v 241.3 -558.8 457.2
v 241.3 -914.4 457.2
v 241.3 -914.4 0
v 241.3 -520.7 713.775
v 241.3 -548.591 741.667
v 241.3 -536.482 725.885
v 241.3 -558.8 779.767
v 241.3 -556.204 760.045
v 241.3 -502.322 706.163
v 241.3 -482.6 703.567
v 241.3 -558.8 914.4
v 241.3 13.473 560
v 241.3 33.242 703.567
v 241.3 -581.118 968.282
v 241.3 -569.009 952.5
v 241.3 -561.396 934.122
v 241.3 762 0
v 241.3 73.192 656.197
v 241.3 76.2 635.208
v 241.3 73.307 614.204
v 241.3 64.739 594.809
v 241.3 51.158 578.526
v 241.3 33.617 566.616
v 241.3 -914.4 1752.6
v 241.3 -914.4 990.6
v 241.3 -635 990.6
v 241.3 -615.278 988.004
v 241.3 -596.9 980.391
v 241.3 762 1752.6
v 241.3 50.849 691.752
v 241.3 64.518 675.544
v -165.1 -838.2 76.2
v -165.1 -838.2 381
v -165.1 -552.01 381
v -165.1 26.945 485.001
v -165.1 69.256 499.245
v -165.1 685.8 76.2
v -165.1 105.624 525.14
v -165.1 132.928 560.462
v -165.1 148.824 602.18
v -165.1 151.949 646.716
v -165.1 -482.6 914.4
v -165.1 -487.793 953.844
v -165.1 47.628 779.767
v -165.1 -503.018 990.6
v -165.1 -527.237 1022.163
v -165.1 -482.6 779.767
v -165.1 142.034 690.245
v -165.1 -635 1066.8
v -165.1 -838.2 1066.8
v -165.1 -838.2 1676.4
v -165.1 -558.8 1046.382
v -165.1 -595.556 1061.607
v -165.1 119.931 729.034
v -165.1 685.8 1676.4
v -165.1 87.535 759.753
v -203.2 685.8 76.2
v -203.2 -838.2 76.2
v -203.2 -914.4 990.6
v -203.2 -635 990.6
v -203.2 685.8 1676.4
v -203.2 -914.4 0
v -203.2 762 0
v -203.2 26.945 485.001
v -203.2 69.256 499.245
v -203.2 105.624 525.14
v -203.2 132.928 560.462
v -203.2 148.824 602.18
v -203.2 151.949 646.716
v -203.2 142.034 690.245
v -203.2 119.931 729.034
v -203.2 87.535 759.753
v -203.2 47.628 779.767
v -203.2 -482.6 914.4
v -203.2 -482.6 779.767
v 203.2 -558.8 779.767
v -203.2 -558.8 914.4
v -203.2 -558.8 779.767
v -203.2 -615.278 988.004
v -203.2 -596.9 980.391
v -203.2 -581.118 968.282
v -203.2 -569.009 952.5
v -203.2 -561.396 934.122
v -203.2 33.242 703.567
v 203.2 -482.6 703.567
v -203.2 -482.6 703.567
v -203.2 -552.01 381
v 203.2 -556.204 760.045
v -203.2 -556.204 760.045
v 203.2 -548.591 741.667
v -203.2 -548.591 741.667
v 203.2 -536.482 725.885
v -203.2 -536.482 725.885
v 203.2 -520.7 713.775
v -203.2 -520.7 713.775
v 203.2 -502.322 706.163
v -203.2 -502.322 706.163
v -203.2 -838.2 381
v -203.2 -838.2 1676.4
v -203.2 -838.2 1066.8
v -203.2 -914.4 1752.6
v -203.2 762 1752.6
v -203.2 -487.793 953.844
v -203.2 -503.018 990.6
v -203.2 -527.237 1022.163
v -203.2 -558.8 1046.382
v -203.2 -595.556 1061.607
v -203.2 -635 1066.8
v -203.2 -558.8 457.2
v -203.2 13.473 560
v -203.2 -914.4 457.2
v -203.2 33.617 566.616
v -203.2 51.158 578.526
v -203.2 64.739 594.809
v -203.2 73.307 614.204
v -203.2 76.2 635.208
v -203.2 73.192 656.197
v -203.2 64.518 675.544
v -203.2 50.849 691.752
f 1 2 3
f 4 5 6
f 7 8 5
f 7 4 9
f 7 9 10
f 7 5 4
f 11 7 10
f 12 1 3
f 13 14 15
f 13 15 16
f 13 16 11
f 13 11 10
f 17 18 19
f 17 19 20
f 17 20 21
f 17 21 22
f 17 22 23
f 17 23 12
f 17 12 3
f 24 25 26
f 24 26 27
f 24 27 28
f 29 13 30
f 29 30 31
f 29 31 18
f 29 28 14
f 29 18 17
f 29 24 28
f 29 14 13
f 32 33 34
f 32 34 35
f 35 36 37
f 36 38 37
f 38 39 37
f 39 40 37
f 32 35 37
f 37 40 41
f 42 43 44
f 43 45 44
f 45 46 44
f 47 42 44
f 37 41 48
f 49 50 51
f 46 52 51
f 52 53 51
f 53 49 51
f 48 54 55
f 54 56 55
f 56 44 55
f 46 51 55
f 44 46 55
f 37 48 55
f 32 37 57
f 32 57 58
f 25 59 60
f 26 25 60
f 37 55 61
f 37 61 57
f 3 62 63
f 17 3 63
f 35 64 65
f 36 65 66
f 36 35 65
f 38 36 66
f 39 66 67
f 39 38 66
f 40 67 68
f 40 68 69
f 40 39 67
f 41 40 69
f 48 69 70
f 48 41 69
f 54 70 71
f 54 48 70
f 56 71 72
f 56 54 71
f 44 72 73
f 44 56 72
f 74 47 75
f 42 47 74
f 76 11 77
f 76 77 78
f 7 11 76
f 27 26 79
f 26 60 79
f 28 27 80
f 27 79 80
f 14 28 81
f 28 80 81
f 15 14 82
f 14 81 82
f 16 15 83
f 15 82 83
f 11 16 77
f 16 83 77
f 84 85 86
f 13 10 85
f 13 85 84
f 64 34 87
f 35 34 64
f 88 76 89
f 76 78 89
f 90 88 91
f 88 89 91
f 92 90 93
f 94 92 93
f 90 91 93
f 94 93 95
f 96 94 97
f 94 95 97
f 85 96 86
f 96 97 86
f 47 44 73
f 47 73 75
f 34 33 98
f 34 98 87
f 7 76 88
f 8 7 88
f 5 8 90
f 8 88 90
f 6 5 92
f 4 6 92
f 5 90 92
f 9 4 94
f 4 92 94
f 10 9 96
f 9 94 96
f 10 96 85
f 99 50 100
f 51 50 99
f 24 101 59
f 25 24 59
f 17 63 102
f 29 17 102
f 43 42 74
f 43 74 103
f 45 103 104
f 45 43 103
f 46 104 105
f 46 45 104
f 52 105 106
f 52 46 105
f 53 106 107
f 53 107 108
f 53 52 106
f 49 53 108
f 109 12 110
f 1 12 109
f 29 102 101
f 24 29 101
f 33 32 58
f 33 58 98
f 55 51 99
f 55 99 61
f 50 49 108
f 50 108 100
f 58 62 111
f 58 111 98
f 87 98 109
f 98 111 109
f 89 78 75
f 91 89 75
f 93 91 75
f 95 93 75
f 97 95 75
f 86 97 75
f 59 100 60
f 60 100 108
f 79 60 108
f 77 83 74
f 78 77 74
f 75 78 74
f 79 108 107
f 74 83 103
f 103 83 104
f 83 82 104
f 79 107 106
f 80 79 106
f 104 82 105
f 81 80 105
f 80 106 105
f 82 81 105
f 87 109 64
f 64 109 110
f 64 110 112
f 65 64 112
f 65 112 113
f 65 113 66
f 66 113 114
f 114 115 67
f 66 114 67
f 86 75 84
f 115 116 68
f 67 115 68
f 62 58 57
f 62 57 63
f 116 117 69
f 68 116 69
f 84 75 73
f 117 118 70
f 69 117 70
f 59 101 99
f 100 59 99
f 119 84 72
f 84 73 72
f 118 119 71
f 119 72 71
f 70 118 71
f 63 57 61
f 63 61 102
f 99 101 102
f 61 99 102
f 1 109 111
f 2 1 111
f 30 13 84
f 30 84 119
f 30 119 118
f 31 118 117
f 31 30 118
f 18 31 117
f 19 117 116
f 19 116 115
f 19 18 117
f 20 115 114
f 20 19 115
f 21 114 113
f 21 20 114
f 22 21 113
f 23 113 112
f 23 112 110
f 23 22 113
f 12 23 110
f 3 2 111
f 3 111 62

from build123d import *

# Parameters (mm, degrees)
F1_DEPTH = 38.1
F3_DEPTH = 203.2


with BuildPart() as f1:
    # F0 (on Right) → F1 (new body, symmetric)
    with BuildSketch(Plane.YZ):
        with BuildLine():
            ThreePointArc((33.242401, 703.56663), (75.487635, 624.604952), (13.472578, 560.000469))
            Line((13.472578, 560.000469), (-558.8, 457.2))
            Line((-558.8, 457.2), (-914.4, 457.2))
            Line((-914.4, 457.2), (-914.4, 0))
            Line((-914.4, 0), (762, 0))
            Line((762, 0), (762, 1752.6))
            Line((762, 1752.6), (0, 1752.6))
            Line((0, 1752.6), (-914.4, 1752.6))
            Line((-914.4, 1752.6), (-914.4, 1295.4))
            Line((-914.4, 1295.4), (-914.4, 990.6))
            Line((-914.4, 990.6), (-635, 990.6))
            ThreePointArc((-635, 990.6), (-581.118463, 968.281537), (-558.8, 914.4))
            Line((-558.8, 914.4), (-558.8, 779.76663))
            ThreePointArc((-558.8, 779.76663), (-536.481537, 725.885093), (-482.6, 703.56663))
            Line((-482.6, 703.56663), (33.242401, 703.56663))
        make_face()
    extrude(amount=F1_DEPTH, both=True)


with BuildPart() as f3:
    # F2 (on Right) + F1_face (on face) → F3 (new body, symmetric)
    with BuildSketch(Plane.YZ):
        with BuildLine():
            Line((-482.6, 703.56663), (33.242401, 703.56663))
            ThreePointArc((33.242401, 703.56663), (75.487635, 624.604952), (13.472578, 560.000469))
            Line((13.472578, 560.000469), (-558.8, 457.2))
            Line((-558.8, 457.2), (-914.4, 457.2))
            Line((-914.4, 457.2), (-914.4, 0))
            Line((-914.4, 0), (762, 0))
            Line((762, 0), (762, 1752.6))
            Line((762, 1752.6), (-914.4, 1752.6))
            Line((-914.4, 1752.6), (-914.4, 990.6))
            Line((-914.4, 990.6), (-635, 990.6))
            ThreePointArc((-635, 990.6), (-581.118463, 968.281537), (-558.8, 914.4))
            Line((-558.8, 914.4), (-558.8, 779.76663))
            ThreePointArc((-558.8, 779.76663), (-536.481537, 725.885093), (-482.6, 703.56663))
        make_face()
        with BuildLine():
            Line((685.8, 1676.4), (685.8, 76.2))
            Line((685.8, 76.2), (-838.2, 76.2))
            Line((-838.2, 76.2), (-838.2, 381))
            Line((-838.2, 381), (-552.010227, 381))
            Line((-552.010227, 381), (26.945156, 485.000938))
            ThreePointArc((26.945156, 485.000938), (152.026232, 624.333001), (47.627542, 779.76663))
            Line((47.627542, 779.76663), (-482.6, 779.76663))
            Line((-482.6, 779.76663), (-482.6, 914.4))
            ThreePointArc((-482.6, 914.4), (-527.236927, 1022.163073), (-635, 1066.8))
            Line((-635, 1066.8), (-838.2, 1066.8))
            Line((-838.2, 1066.8), (-838.2, 1676.4))
            Line((-838.2, 1676.4), (685.8, 1676.4))
        make_face(mode=Mode.SUBTRACT)
    with BuildSketch(Plane(origin=(38.1, -19.491345, 899.616806), x_dir=(0, 1, 0), z_dir=(1, 0, 0))):
        with BuildLine():
            ThreePointArc((52.733746, -196.050176), (94.97898, -275.011854), (32.963923, -339.616337))
            Line((32.963923, -339.616337), (-539.308655, -442.416806))
            Line((-539.308655, -442.416806), (-894.908655, -442.416806))
            Line((-894.908655, -442.416806), (-894.908655, -899.616806))
            Line((-894.908655, -899.616806), (781.491345, -899.616806))
            Line((781.491345, -899.616806), (781.491345, 852.983194))
            Line((781.491345, 852.983194), (-894.908655, 852.983194))
            Line((-894.908655, 852.983194), (-894.908655, 90.983194))
            Line((-894.908655, 90.983194), (-615.508655, 90.983194))
            ThreePointArc((-615.508655, 90.983194), (-561.627118, 68.664731), (-539.308655, 14.783194))
            Line((-539.308655, 14.783194), (-539.308655, -119.850176))
            ThreePointArc((-539.308655, -119.850176), (-516.990192, -173.731712), (-463.108655, -196.050176))
            Line((-463.108655, -196.050176), (52.733746, -196.050176))
        make_face()
    extrude(amount=F3_DEPTH, both=True)


with BuildPart() as f1_1:
    add(f1.part)

    # F4: union F3
    add(f3.part)


solid = f1_1.part
